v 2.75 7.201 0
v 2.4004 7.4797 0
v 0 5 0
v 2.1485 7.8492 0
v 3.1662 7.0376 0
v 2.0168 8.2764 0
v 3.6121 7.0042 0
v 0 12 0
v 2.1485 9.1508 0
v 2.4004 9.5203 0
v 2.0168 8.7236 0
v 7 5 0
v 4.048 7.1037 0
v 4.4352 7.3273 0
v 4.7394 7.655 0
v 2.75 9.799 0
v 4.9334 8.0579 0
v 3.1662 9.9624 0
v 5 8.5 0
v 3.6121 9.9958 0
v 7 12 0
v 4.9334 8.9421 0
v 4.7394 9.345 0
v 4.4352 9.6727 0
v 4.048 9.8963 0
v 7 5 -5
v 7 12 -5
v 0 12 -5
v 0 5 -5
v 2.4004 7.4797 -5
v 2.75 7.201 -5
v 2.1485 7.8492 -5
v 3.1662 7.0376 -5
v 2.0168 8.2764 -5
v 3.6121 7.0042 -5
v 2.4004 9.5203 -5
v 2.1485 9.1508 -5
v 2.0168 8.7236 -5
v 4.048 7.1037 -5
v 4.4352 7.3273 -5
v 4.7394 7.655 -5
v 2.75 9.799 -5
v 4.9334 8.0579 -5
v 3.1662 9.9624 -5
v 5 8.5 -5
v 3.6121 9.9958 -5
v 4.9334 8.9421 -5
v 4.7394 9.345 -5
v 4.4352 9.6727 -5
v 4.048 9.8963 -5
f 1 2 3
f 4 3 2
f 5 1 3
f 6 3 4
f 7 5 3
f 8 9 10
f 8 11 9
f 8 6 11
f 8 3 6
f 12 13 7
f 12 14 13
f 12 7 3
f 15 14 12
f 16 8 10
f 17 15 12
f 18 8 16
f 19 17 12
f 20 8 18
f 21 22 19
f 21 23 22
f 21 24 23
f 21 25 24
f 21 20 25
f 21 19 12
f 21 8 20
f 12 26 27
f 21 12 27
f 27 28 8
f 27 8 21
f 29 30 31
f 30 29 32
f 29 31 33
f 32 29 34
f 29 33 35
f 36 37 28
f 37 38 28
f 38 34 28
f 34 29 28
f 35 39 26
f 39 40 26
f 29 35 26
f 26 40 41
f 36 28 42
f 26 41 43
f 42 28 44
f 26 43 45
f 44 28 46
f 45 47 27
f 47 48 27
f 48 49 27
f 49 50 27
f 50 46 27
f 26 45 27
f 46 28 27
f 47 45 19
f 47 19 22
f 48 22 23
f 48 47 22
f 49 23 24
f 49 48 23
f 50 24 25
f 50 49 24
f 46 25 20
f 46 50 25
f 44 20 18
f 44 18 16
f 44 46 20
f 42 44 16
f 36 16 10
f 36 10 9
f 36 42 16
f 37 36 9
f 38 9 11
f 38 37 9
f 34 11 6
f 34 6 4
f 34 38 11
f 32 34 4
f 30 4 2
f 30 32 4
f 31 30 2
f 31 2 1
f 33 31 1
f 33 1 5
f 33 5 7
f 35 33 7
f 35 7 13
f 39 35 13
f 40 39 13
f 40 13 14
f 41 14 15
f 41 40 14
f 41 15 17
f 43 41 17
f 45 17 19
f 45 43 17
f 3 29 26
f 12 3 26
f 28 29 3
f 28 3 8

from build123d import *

# Parameters (mm, degrees)
CYLINDER_R     = 1.5
CYLINDER_DEPTH = 5
BOX009_W       = 7
BOX009_H       = 7
BOX009_DEPTH   = 5


with BuildPart() as screwhole:
    # Cylinder → Cylinder (new body)
    with BuildSketch(Plane(origin=(3.5, 8.5, -5), x_dir=(1, 0, 0), z_dir=(0, 0, 1))):
        Circle(CYLINDER_R)
    extrude(amount=CYLINDER_DEPTH)


with BuildPart() as cut005:
    # Box009 → Box009 (new body)
    with BuildSketch(Plane(origin=(0, 5, -5), x_dir=(1, 0, 0), z_dir=(0, 0, 1))):
        with Locations((3.5, 3.5)):
            Rectangle(BOX009_W, BOX009_H)
    extrude(amount=BOX009_DEPTH)

    # Cut005: cut ScrewHole
    add(screwhole.part, mode=Mode.SUBTRACT)


solid = cut005.part
